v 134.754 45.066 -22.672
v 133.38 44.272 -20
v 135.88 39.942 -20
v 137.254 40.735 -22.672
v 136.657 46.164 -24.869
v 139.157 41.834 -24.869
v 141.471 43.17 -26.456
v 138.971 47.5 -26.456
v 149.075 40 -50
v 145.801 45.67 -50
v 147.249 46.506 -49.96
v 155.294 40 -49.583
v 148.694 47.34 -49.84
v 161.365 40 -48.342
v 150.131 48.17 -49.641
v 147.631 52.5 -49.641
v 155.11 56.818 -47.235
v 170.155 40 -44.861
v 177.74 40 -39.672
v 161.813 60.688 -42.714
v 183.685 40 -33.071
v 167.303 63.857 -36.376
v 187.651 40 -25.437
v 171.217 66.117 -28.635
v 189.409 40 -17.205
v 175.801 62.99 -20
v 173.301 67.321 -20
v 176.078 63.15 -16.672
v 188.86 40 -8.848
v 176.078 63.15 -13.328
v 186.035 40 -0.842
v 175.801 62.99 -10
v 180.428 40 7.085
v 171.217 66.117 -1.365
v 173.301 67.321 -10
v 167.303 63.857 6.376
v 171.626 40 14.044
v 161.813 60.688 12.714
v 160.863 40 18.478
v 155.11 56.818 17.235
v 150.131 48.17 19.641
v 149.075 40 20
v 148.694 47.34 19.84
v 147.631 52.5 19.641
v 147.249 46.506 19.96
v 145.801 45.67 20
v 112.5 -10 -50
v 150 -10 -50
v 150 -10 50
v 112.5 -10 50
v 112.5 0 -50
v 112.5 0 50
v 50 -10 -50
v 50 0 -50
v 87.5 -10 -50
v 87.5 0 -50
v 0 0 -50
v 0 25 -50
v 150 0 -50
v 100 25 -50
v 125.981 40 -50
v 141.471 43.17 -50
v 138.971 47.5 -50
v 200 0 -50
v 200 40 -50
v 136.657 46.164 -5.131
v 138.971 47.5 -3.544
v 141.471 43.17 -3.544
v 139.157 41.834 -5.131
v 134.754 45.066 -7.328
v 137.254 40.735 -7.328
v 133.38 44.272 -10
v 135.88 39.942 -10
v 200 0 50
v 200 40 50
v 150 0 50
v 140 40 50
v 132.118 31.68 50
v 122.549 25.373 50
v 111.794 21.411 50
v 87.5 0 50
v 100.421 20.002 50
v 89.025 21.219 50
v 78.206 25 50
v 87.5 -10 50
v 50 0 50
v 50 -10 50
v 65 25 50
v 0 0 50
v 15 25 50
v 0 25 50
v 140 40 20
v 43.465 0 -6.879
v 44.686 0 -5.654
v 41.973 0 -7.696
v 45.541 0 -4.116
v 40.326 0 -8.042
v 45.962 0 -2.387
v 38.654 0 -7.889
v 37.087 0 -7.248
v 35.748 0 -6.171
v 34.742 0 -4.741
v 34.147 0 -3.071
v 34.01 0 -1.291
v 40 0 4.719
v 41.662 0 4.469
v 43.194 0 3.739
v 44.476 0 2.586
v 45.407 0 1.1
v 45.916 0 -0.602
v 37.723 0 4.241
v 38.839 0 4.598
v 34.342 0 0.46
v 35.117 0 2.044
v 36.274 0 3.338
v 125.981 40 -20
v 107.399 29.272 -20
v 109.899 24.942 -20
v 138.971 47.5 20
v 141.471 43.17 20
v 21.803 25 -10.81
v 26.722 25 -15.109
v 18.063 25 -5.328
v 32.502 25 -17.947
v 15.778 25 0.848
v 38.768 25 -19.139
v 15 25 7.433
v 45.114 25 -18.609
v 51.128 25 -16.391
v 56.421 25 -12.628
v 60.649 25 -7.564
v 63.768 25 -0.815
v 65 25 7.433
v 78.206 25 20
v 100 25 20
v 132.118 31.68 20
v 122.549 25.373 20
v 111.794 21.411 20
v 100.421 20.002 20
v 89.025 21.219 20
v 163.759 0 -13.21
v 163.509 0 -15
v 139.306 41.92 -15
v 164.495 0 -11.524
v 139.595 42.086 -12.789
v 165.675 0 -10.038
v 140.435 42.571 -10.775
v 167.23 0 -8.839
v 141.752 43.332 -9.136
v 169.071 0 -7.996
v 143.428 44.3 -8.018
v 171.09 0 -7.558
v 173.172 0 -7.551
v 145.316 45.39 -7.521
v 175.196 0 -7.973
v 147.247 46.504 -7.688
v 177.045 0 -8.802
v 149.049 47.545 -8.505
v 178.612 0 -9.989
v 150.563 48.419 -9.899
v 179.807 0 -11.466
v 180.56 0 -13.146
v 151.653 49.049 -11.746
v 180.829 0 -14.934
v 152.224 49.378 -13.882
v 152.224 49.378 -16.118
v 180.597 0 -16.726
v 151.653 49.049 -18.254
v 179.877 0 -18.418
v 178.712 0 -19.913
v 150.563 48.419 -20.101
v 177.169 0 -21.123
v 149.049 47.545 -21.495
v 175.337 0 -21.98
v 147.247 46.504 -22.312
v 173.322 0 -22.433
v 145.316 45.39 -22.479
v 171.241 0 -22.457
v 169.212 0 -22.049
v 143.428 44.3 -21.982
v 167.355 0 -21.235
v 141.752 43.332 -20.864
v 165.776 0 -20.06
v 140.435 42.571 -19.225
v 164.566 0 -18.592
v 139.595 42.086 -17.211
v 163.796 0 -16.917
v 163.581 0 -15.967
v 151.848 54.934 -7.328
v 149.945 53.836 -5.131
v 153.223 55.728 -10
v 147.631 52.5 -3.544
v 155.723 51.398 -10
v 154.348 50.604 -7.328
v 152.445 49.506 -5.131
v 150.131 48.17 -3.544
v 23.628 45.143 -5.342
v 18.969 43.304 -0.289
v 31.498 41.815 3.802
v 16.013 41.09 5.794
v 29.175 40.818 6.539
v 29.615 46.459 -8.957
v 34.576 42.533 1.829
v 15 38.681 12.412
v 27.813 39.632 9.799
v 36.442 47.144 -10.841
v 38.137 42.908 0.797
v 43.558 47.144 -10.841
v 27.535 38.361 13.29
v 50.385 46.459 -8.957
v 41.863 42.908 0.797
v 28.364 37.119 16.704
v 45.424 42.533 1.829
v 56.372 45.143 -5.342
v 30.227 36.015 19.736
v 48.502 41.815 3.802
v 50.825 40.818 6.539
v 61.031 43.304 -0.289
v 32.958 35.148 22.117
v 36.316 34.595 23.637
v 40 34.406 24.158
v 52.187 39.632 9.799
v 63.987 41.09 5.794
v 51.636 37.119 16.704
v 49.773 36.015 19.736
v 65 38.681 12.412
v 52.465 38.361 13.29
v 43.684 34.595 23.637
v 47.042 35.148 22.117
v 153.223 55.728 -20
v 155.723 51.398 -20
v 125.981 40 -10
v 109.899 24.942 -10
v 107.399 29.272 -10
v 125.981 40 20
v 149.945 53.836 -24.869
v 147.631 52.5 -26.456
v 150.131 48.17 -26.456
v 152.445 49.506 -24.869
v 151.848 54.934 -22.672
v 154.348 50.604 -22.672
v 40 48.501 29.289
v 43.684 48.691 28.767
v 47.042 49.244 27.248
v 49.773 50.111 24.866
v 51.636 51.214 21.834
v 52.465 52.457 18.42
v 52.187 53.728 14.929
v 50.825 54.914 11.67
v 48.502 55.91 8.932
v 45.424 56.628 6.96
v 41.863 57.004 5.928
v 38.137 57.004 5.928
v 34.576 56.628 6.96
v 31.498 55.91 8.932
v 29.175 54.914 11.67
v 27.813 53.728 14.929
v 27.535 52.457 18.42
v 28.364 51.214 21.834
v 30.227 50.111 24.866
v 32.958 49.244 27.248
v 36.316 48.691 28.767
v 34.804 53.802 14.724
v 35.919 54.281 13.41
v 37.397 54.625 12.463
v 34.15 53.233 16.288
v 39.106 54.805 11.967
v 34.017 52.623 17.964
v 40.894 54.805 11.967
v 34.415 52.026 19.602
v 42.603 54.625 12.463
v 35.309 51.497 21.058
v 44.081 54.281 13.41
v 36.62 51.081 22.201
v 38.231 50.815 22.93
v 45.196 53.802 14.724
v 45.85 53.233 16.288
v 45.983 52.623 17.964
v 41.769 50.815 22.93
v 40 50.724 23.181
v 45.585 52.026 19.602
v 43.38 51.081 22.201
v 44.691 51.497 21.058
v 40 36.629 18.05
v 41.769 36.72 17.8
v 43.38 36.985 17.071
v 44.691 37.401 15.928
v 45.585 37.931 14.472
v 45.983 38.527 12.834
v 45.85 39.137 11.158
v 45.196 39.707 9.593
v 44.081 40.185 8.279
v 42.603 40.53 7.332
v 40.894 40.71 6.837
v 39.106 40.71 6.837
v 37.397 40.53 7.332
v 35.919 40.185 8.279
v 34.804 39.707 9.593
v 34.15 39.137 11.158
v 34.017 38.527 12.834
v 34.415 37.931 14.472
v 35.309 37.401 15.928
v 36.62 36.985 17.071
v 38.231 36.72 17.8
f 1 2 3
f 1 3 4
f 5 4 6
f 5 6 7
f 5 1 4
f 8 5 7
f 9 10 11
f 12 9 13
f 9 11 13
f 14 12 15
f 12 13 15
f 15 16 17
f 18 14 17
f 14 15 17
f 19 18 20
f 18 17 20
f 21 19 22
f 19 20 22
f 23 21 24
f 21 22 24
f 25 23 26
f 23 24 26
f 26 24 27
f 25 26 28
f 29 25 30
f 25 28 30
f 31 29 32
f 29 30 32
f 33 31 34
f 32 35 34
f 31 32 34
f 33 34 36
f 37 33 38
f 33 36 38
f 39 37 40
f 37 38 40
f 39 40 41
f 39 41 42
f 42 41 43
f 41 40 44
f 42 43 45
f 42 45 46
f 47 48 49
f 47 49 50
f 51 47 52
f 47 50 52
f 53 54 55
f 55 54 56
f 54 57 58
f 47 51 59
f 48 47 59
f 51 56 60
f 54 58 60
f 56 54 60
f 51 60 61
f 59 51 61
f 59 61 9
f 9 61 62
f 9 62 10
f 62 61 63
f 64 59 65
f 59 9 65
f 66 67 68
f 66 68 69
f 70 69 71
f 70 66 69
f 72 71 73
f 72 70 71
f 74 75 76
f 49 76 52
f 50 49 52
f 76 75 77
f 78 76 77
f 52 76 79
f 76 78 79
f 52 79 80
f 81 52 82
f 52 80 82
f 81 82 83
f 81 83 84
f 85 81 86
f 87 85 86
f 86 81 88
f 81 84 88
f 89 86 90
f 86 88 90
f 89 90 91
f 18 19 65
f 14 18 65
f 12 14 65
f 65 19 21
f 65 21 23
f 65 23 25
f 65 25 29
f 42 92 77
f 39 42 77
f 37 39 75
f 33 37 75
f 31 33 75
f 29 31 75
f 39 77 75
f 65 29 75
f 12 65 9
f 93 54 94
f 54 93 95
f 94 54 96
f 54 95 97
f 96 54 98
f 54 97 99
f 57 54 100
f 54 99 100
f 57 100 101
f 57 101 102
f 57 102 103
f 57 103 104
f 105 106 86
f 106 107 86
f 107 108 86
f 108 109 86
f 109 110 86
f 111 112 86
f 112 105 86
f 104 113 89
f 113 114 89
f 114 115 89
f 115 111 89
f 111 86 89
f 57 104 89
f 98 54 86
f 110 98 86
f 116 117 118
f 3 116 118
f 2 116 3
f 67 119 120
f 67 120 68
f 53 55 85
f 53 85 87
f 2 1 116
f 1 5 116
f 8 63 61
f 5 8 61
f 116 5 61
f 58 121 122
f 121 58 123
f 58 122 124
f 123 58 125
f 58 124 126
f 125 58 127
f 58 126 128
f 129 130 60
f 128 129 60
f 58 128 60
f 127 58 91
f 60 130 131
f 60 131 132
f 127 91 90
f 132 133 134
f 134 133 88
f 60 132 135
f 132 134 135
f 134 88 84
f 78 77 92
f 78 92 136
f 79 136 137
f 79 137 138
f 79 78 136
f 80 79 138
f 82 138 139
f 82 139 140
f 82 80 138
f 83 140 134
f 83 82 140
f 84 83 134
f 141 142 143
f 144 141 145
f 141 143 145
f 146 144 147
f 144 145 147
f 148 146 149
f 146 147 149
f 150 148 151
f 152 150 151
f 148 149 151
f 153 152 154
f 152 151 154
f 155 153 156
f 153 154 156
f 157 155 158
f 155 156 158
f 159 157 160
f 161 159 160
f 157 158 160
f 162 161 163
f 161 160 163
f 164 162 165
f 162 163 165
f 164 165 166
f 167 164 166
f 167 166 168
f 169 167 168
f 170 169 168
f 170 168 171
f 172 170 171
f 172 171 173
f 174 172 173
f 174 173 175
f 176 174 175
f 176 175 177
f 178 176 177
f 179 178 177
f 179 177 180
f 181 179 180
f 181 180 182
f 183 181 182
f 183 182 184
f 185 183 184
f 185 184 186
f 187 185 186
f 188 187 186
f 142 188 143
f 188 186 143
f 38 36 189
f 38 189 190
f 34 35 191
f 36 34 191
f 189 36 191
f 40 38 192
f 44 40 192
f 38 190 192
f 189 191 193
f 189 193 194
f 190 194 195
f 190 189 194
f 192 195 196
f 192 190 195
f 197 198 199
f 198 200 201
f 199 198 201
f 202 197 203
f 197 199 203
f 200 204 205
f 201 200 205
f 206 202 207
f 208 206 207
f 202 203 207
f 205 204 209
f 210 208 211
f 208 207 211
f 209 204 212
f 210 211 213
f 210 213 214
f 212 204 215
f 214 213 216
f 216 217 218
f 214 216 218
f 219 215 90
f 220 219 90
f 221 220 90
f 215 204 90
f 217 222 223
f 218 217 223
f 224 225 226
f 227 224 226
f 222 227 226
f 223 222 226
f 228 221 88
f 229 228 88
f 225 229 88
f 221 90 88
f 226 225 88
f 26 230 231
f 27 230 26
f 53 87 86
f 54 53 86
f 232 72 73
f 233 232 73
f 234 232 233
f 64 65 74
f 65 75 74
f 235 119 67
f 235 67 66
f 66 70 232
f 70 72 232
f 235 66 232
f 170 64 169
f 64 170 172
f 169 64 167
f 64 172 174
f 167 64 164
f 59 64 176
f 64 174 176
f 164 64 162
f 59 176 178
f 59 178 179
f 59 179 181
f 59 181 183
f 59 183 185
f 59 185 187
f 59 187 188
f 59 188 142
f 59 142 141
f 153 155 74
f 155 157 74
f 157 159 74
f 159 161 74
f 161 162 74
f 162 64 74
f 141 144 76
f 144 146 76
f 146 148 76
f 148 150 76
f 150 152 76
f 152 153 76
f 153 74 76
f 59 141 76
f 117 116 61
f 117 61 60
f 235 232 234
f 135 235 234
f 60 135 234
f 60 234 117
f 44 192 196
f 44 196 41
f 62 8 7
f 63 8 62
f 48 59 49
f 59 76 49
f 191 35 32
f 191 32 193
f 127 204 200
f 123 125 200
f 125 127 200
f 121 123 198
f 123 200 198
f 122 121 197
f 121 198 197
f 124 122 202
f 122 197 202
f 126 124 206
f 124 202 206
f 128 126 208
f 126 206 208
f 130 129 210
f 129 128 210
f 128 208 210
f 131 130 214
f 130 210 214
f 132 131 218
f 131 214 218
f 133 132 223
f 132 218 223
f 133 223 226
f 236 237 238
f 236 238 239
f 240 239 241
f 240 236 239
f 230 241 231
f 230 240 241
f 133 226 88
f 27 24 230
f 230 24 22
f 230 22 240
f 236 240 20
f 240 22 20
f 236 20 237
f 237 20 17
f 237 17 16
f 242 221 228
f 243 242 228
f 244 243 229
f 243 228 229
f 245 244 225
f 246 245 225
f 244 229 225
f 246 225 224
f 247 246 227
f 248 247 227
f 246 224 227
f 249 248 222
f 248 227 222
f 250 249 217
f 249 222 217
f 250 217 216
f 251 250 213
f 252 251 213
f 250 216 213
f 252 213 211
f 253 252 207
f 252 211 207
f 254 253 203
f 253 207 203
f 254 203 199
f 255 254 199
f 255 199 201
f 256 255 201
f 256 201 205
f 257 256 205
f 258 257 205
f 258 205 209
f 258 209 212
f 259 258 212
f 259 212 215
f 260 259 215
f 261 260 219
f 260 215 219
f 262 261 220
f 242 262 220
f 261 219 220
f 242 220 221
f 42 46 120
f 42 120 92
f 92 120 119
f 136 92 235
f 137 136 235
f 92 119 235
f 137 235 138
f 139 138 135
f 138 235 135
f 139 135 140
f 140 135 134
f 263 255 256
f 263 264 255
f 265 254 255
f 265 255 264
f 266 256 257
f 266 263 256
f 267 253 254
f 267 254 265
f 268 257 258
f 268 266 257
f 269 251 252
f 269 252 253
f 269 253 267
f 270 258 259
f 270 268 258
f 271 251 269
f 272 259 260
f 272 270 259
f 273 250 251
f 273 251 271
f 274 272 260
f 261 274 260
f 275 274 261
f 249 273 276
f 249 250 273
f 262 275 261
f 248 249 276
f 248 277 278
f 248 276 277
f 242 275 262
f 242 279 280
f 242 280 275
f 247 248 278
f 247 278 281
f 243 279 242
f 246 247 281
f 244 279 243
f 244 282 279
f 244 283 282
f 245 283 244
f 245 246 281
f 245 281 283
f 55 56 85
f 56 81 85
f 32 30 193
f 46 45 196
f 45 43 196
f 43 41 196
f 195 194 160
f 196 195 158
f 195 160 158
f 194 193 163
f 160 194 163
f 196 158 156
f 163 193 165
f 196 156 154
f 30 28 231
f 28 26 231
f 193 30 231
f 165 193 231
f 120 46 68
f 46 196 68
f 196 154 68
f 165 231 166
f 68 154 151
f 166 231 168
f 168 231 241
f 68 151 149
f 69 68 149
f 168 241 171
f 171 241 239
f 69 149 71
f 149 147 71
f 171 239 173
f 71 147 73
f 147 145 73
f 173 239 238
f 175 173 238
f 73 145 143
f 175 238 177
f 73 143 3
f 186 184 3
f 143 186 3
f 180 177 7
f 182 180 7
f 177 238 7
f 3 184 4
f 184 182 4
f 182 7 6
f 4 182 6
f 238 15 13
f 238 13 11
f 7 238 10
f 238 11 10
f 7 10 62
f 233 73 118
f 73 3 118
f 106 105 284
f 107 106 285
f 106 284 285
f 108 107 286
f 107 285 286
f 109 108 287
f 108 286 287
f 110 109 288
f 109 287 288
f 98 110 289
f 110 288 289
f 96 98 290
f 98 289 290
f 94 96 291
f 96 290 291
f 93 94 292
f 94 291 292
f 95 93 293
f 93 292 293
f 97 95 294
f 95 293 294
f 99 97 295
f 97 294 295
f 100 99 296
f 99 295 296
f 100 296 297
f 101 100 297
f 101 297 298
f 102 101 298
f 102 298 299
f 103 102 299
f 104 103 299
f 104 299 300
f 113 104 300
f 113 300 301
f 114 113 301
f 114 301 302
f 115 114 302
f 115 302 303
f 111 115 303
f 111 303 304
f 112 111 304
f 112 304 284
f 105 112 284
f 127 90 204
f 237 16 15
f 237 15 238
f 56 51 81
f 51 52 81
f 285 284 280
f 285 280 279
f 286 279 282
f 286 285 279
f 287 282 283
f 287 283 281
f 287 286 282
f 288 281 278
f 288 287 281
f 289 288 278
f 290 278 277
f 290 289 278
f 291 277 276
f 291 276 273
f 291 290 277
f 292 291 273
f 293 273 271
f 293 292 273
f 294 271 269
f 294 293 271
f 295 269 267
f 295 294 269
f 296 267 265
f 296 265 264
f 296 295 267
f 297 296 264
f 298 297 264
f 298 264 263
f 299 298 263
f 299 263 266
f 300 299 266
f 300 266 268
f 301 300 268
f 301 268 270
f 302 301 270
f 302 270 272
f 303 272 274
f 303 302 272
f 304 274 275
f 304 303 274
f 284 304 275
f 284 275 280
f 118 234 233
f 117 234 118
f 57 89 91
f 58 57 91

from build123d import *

# Parameters (mm, degrees)
SALIENTE_EXTRUIR1_DEPTH = 50
CORTAR_EXTRUIR1_DEPTH   = 30
SALIENTE_EXTRUIR2_REACH = 69.091
CROQUIS4_R              = 12.5
CROQUIS4_R_2            = 6
SALIENTE_EXTRUIR3_DEPTH = 15
CROQUIS5_R              = 6
CORTAR_EXTRUIR2_DEPTH   = 68.09125606
CORTAR_EXTRUIR3_DEPTH   = 101
SALIENTE_EXTRUIR5_REACH = 82.311
CORTAR_EXTRUIR4_DEPTH   = 5
CROQUIS9_R              = 7.5
CORTAR_EXTRUIR5_DEPTH   = 76.310889132


with BuildPart() as part:
    # Croquis1 → Saliente-Extruir1 (new body, symmetric)
    with BuildSketch(Plane.XY):
        Polygon((0, 0), (0, 25), (100, 25), (100, 40), (200, 40), (200, 0), (150, 0), (150, -10), (112.5, -10), (112.5, 0), (87.5, 0), (87.5, -10), (50, -10), (50, 0), align=None)
    extrude(amount=SALIENTE_EXTRUIR1_DEPTH, both=True)

    # Croquis2 → Cortar-Extruir1 (cut)
    with BuildSketch(Plane.XY.offset(50)):
        with BuildLine():
            Line((78.205505282, 25), (100, 25))
            Line((100, 25), (100, 40))
            Line((100, 40), (140, 40))
            ThreePointArc((140, 40), (111.794494718, 21.411010565), (78.205505282, 25))
        make_face()
    extrude(amount=-CORTAR_EXTRUIR1_DEPTH, mode=Mode.SUBTRACT)

    # Saliente-Extruir2: up to this face of the body (flat: up to its plane)
    saliente_extruir2_end = Plane(part.part.faces().sort_by_distance((47.264467122, 25, -2.448514344))[0])
    # Croquis3 → Saliente-Extruir2 (add, up to the picked face)
    with BuildSketch(Plane(origin=(0, 38.145245781, 13.883734043), x_dir=(-1, 0, 0), z_dir=(0, 0.939692621, 0.342020143)), mode=Mode.PRIVATE) as saliente_extruir2_sk1:
        with BuildLine():
            Line((-15, 38.434127456), (-15, -1.565872544))
            ThreePointArc((-15, -1.565872544), (-40, -26.565872544), (-65, -1.565872544))
            Line((-65, -1.565872544), (-65, 38.434127456))
            Line((-65, 38.434127456), (-15, 38.434127456))
        make_face()
    saliente_extruir2_tool1 = split(extrude(saliente_extruir2_sk1.sketch, amount=-SALIENTE_EXTRUIR2_REACH, mode=Mode.PRIVATE), bisect_by=saliente_extruir2_end, keep=Keep.BOTH, mode=Mode.PRIVATE)
    add(saliente_extruir2_tool1.solids().sort_by(Axis((40, 35.287462, 21.735431), (0, -0.939692621, -0.342020143)))[0])

    # Croquis4 → Saliente-Extruir3 (add)
    with BuildSketch(Plane(origin=(0, 38.145245781, 13.883734043), x_dir=(1, 0, 0), z_dir=(0, 0.939692621, 0.342020143))):
        with Locations(Location((40, 1.565872544, 0), (0, 0, 270))):  # turned: the seam where the file's is
            Circle(CROQUIS4_R)
        with Locations(Location((40, 1.565872544, 0), (0, 0, 270))):  # turned: the seam where the file's is
            Circle(CROQUIS4_R_2, mode=Mode.SUBTRACT)
    extrude(amount=SALIENTE_EXTRUIR3_DEPTH)

    # Croquis5 → Cortar-Extruir2 (cut, through all)
    with BuildSketch(Plane(origin=(0, 38.145245781, 13.883734043), x_dir=(-1, 0, 0), z_dir=(0, 0.939692621, 0.342020143))):
        with Locations(Location((-40, -1.565872544, 0), (0, 0, 90))):  # turned: the seam where the file's is
            Circle(CROQUIS5_R)
    extrude(amount=-CORTAR_EXTRUIR2_DEPTH, mode=Mode.SUBTRACT)

    # Croquis6 → Cortar-Extruir3 (cut, through all)
    with BuildSketch(Plane.XY.offset(50)):
        Polygon((100, 25), (100, 40), (125.980762114, 40), align=None)
    extrude(amount=-CORTAR_EXTRUIR3_DEPTH, mode=Mode.SUBTRACT)

    # Saliente-Extruir5: up to this face of the body (flat: up to its plane)
    saliente_extruir5_end = Plane(part.part.faces().sort_by_distance((164.797670499, 40, -2.108504349))[0])
    # Croquis7 → Saliente-Extruir5 (add, up to the picked face)
    with BuildSketch(Plane(origin=(14.174682453, -24.551270189, 0), x_dir=(0.866025404, 0.5, 0), z_dir=(-0.5, 0.866025404, 0)), mode=Mode.PRIVATE) as saliente_extruir5_sk1:
        with BuildLine():
            Line((99.102540378, 50), (149.102540378, 50))
            ThreePointArc((149.102540378, 50), (184.102540378, 15), (149.102540378, -20))
            Line((149.102540378, -20), (99.102540378, -20))
            Line((99.102540378, -20), (99.102540378, 50))
        make_face()
    saliente_extruir5_tool1 = split(extrude(saliente_extruir5_sk1.sketch, amount=-SALIENTE_EXTRUIR5_REACH, mode=Mode.PRIVATE), bisect_by=saliente_extruir5_end, keep=Keep.BOTH, mode=Mode.PRIVATE)
    add(saliente_extruir5_tool1.solids().sort_by(Axis((133.894705, 44.569117, -15), (0.5, -0.866025404, 0)))[0])

    # Croquis8 → Cortar-Extruir4 (cut)
    with BuildSketch(Plane(origin=(14.174682453, -24.551270189, 0), x_dir=(0.866025404, 0.5, 0), z_dir=(-0.5, 0.866025404, 0))):
        with BuildLine():
            Line((154.102540378, 3.543560763), (154.102540378, -26.456439237))
            Line((154.102540378, -26.456439237), (144.102540378, -26.456439237))
            Line((144.102540378, -26.456439237), (144.102540378, 3.543560763))
            ThreePointArc((144.102540378, 3.543560763), (140.263705614, 6.161165235), (137.646101141, 10))
            Line((137.646101141, 10), (107.646101141, 10))
            Line((107.646101141, 10), (107.646101141, 20))
            Line((107.646101141, 20), (137.646101141, 20))
            ThreePointArc((137.646101141, 20), (140.263705614, 23.838834765), (144.102540378, 26.456439237))
            Line((144.102540378, 26.456439237), (144.102540378, 56.456439237))
            Line((144.102540378, 56.456439237), (154.102540378, 56.456439237))
            Line((154.102540378, 56.456439237), (154.102540378, 26.456439237))
            ThreePointArc((154.102540378, 26.456439237), (157.941375143, 23.838834765), (160.558979616, 20))
            Line((160.558979616, 20), (190.558979616, 20))
            Line((190.558979616, 20), (190.558979616, 10))
            Line((190.558979616, 10), (160.558979616, 10))
            ThreePointArc((160.558979616, 10), (157.941375143, 6.161165235), (154.102540378, 3.543560763))
        make_face()
    extrude(amount=-CORTAR_EXTRUIR4_DEPTH, mode=Mode.SUBTRACT)

    # Croquis9 → Cortar-Extruir5 (cut, through all)
    with BuildSketch(Plane(origin=(16.674682453, -28.881397208, 0), x_dir=(0.866025404, 0.5, 0), z_dir=(-0.5, 0.866025404, 0))):
        with Locations(Location((149.102540378, 15, 0), (0, 0, 180))):  # turned: the seam where the file's is
            Circle(CROQUIS9_R)
    extrude(amount=-CORTAR_EXTRUIR5_DEPTH, mode=Mode.SUBTRACT)


solid = part.part
